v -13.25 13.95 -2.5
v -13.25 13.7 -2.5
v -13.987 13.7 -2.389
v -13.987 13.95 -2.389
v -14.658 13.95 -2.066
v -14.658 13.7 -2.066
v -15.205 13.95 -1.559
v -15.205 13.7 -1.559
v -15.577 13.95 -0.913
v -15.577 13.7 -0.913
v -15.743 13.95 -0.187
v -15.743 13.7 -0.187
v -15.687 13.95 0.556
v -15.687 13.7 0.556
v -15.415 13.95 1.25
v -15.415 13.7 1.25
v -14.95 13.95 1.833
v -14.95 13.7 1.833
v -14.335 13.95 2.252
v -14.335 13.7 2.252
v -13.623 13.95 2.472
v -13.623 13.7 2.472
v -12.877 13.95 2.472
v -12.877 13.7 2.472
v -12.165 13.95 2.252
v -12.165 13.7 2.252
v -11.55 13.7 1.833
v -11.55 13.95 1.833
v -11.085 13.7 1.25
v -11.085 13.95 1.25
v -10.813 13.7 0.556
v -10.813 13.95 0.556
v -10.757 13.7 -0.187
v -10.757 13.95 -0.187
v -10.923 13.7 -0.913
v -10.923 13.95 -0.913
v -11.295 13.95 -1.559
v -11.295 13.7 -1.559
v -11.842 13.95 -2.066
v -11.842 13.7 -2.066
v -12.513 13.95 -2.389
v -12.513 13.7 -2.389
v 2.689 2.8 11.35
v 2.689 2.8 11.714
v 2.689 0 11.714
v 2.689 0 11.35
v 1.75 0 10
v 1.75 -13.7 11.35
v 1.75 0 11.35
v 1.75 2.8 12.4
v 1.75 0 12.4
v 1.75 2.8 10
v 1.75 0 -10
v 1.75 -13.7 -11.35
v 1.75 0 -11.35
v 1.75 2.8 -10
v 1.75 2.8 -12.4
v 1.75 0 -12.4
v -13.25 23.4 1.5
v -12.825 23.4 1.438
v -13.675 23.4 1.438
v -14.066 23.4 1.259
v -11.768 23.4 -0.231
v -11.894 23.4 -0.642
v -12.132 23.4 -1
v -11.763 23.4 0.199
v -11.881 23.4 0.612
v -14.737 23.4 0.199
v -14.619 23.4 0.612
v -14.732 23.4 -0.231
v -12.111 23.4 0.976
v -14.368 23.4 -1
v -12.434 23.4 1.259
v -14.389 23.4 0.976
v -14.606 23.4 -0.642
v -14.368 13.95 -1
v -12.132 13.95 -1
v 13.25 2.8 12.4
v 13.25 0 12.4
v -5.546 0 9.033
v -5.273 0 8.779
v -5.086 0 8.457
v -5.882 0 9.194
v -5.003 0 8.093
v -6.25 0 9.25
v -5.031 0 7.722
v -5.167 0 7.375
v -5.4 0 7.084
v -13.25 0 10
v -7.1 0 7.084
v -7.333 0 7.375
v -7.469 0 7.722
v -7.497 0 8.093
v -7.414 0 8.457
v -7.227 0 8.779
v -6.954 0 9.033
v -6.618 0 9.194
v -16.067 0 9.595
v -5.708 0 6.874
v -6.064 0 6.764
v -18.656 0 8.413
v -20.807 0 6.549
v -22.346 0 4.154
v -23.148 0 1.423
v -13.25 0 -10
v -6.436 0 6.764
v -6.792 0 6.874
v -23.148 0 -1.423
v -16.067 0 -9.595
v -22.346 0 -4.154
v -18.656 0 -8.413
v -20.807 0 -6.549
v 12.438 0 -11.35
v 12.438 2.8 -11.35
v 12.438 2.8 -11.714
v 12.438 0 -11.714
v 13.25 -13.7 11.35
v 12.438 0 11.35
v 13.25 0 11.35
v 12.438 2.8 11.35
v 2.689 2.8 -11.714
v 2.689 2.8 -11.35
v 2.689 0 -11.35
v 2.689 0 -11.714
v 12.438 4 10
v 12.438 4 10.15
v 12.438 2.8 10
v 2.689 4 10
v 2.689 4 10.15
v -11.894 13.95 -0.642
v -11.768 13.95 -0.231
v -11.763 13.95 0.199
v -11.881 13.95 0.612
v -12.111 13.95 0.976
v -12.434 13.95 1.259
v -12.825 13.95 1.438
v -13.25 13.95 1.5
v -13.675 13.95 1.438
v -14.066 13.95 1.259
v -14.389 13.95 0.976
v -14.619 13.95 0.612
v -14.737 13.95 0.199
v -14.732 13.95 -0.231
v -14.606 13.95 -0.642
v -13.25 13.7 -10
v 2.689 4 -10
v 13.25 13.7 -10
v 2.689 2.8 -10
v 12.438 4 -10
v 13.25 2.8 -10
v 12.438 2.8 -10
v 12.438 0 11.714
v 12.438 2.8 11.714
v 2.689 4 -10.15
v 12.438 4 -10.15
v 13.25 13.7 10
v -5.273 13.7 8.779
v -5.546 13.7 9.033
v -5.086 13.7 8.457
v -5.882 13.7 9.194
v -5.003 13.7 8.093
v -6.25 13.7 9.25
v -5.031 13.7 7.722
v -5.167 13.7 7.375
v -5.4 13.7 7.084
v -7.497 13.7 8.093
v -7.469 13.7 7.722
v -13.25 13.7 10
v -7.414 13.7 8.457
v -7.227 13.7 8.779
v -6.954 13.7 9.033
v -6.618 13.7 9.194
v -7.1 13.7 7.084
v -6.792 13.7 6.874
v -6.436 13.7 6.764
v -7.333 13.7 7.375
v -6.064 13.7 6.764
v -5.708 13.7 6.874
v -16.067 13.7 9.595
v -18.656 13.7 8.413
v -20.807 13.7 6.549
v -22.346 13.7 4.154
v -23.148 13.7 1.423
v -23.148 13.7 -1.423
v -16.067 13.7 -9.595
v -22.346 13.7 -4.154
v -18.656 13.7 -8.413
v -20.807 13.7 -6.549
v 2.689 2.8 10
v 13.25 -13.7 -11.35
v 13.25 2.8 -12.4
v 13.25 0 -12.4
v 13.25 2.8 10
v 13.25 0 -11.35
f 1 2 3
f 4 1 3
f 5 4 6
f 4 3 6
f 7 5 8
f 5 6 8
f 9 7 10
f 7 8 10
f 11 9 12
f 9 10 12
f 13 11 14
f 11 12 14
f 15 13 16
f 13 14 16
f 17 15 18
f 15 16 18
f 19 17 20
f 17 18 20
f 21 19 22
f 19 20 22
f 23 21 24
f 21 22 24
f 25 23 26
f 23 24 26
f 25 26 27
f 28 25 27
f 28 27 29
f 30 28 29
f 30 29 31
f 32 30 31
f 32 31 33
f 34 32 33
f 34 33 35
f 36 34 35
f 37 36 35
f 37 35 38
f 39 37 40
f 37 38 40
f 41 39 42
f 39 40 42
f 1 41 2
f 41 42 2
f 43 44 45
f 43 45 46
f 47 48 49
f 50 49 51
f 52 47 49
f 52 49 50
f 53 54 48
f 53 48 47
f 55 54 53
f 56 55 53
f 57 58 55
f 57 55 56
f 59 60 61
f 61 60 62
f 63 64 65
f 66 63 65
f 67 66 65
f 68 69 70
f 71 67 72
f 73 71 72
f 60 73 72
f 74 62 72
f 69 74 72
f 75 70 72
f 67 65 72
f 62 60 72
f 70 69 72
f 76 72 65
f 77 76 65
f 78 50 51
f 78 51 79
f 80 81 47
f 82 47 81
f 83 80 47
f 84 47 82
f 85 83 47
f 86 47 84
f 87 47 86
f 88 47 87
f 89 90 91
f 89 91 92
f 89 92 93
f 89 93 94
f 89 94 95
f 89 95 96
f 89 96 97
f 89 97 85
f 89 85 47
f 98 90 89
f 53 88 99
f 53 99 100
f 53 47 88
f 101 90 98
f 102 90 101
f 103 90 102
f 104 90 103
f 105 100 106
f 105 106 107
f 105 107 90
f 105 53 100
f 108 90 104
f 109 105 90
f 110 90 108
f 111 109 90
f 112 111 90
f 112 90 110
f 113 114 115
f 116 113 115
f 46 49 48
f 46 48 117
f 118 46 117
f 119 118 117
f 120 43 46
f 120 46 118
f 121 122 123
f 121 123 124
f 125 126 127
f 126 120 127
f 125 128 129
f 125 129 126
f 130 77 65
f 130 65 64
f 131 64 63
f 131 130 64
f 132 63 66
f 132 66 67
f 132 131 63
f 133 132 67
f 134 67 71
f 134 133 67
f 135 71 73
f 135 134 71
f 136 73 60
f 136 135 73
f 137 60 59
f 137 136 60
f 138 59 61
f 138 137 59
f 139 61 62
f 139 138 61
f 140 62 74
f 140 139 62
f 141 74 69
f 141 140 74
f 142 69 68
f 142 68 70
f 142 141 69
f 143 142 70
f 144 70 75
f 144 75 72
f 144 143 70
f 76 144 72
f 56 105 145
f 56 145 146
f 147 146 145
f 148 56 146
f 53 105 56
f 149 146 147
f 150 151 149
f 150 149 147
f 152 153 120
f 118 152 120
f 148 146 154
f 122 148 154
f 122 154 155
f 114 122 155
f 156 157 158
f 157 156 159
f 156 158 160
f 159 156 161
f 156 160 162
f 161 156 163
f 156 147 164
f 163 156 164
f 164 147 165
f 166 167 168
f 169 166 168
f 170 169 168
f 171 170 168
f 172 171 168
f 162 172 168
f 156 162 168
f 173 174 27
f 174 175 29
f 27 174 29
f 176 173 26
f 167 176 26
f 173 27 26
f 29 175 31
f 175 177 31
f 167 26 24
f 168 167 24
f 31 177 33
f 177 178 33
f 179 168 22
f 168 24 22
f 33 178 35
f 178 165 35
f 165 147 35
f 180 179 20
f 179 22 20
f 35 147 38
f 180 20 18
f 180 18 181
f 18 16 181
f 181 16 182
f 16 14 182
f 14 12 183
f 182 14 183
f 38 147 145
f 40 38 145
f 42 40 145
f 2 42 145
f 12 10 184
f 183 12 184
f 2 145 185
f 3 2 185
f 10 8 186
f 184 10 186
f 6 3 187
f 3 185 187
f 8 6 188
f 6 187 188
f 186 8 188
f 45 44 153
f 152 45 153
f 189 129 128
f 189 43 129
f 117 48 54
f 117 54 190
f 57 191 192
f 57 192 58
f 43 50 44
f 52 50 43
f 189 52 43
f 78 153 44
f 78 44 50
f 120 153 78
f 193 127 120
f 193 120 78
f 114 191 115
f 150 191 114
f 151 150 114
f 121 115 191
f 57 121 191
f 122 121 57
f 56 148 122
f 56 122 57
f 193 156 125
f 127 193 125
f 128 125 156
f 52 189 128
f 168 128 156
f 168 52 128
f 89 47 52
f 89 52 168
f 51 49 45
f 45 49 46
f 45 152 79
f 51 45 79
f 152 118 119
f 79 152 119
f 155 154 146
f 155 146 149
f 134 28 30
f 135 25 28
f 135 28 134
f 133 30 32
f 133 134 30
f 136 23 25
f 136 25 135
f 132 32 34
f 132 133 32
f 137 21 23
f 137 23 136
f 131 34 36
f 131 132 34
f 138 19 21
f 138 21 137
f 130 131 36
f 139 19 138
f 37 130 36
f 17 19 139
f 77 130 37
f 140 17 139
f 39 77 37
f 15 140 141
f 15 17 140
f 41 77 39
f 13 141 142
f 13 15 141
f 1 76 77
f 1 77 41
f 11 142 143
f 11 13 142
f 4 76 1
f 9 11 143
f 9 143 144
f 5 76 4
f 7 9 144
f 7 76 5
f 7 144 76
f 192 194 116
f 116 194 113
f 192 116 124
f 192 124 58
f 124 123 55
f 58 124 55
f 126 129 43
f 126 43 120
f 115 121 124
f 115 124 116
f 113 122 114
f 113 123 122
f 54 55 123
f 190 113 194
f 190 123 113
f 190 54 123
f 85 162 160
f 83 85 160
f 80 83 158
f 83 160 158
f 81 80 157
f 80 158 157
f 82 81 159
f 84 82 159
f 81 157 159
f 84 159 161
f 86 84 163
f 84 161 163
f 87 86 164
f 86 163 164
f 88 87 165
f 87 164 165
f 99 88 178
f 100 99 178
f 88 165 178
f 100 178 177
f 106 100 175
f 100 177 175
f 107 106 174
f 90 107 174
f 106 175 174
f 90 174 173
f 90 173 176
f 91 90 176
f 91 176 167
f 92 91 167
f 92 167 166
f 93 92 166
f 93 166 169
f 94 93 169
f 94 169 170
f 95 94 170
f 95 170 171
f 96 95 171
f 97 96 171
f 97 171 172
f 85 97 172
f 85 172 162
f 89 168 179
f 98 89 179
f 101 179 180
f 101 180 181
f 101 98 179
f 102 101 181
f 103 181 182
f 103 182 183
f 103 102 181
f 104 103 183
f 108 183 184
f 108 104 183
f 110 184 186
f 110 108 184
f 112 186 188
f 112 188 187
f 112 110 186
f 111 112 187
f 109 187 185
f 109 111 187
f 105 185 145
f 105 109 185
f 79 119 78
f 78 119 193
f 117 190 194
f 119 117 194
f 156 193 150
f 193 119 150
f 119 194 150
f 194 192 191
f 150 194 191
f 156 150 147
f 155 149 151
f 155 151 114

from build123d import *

# Parameters (mm, degrees)
EXTRUDE_1_DEPTH      = 13.7
EXTRUDE_2_DEPTH      = 9.7
SKETCH_3_W           = 11.5
SKETCH_3_H           = 22.7
EXTRUDE_3_DEPTH      = 13.7
SKETCH_4_W           = 11.5
SKETCH_4_H           = 2.8
EXTRUDE_4_DEPTH      = 2.4
SKETCH_5_W           = 11.5
SKETCH_5_H           = 2.8
EXTRUDE_5_DEPTH      = 2.4
SKETCH_6_W           = 9.748758204
SKETCH_6_H           = 1.713624198
CUT_EXTRUDE_7_DEPTH  = 2.8
SKETCH_7_W           = 9.748758204
SKETCH_7_H           = 1.35
EXTRUDE_8_DEPTH      = 4
CHAMFER_1_SIZE       = 1.2
SKETCH_8_R           = 2.5
EXTRUDE_9_DEPTH      = 0.25
SKETCH_9_R           = 1.25
CUT_EXTRUDE_10_DEPTH = 39.014240753


with BuildPart() as part:
    # Эскиз1 → Вытянуть1 (new body)
    with BuildSketch(Plane(origin=(0, 0, 0), x_dir=(1, 0, 0), z_dir=(0, 1, 0))):
        with BuildLine():
            Line((-13.25, 10), (13.25, 10))
            Line((13.25, 10), (13.25, -10))
            Line((13.25, -10), (-13.25, -10))
            ThreePointArc((-13.25, -10), (-23.25, 0), (-13.25, 10))
        make_face()
    extrude(amount=EXTRUDE_1_DEPTH)

    # Эскиз2 → Вытянуть2 (add)
    with BuildSketch(Plane(origin=(0, 13.7, 0), x_dir=(1, 0, 0), z_dir=(0, 1, 0))):
        with BuildLine():
            Line((-14.368033989, 1), (-12.131966011, 1))
            ThreePointArc((-12.131966011, 1), (-13.25, -1.5), (-14.368033989, 1))
        make_face()
    extrude(amount=EXTRUDE_2_DEPTH)

    # Эскиз3 → Вытянуть3 (add)
    with BuildSketch(Plane.XZ):
        with Locations((7.5, 0)):
            Rectangle(SKETCH_3_W, SKETCH_3_H)
    extrude(amount=EXTRUDE_3_DEPTH)

    # Эскиз4 → Вытянуть4 (add)
    with BuildSketch(Plane(origin=(0, 0, -10), x_dir=(-1, 0, 0), z_dir=(0, 0, -1))):
        with Locations((-7.5, 1.4)):
            Rectangle(SKETCH_4_W, SKETCH_4_H)
    extrude(amount=EXTRUDE_4_DEPTH)

    # Эскиз5 → Вытянуть5 (add)
    with BuildSketch(Plane.XY.offset(10)):
        with Locations((7.5, 1.4)):
            Rectangle(SKETCH_5_W, SKETCH_5_H)
    extrude(amount=EXTRUDE_5_DEPTH)

    # Эскиз6 → Вытянуть7 (cut)
    with BuildSketch(Plane(origin=(0, 2.8, 0), x_dir=(1, 0, 0), z_dir=(0, 1, 0))):
        with Locations((7.563806599, 10.856812099)):
            Rectangle(SKETCH_6_W, SKETCH_6_H)
        with Locations((7.563806599, -10.856812099)):
            Rectangle(SKETCH_6_W, SKETCH_6_H)
    extrude(amount=-CUT_EXTRUDE_7_DEPTH, mode=Mode.SUBTRACT)

    # Эскиз7 → Вытянуть8 (add)
    with BuildSketch(Plane(origin=(0, 0, 0), x_dir=(1, 0, 0), z_dir=(0, 1, 0))):
        with Locations((7.563806599, 10.675)):
            Rectangle(SKETCH_7_W, SKETCH_7_H)
        with Locations((7.563806599, -10.675)):
            Rectangle(SKETCH_7_W, SKETCH_7_H)
    extrude(amount=EXTRUDE_8_DEPTH)

    # Фаска1
    chamfer_1_edges = [part.edges().sort_by_distance(p)[0] for p in [
        (7.563806599, 4, -11.35),
        (7.563806599, 4, 11.35),
    ]]
    chamfer(chamfer_1_edges, length=CHAMFER_1_SIZE)

    # Эскиз8 → Вытянуть9 (add)
    with BuildSketch(Plane(origin=(0, 13.7, 0), x_dir=(1, 0, 0), z_dir=(0, 1, 0))):
        with Locations(Location((-13.25, 0, 0), (0, 0, 90))):
            Circle(SKETCH_8_R)
    extrude(amount=EXTRUDE_9_DEPTH)

    # Эскиз9 → Вытянуть10 (cut, through all)
    with BuildSketch(Plane(origin=(0, 13.7, 0), x_dir=(1, 0, 0), z_dir=(0, 1, 0))):
        with Locations(Location((-6.25, -8, 0), (0, 0, 270))):
            Circle(SKETCH_9_R)
    extrude(amount=-CUT_EXTRUDE_10_DEPTH, mode=Mode.SUBTRACT)


solid = part.part
